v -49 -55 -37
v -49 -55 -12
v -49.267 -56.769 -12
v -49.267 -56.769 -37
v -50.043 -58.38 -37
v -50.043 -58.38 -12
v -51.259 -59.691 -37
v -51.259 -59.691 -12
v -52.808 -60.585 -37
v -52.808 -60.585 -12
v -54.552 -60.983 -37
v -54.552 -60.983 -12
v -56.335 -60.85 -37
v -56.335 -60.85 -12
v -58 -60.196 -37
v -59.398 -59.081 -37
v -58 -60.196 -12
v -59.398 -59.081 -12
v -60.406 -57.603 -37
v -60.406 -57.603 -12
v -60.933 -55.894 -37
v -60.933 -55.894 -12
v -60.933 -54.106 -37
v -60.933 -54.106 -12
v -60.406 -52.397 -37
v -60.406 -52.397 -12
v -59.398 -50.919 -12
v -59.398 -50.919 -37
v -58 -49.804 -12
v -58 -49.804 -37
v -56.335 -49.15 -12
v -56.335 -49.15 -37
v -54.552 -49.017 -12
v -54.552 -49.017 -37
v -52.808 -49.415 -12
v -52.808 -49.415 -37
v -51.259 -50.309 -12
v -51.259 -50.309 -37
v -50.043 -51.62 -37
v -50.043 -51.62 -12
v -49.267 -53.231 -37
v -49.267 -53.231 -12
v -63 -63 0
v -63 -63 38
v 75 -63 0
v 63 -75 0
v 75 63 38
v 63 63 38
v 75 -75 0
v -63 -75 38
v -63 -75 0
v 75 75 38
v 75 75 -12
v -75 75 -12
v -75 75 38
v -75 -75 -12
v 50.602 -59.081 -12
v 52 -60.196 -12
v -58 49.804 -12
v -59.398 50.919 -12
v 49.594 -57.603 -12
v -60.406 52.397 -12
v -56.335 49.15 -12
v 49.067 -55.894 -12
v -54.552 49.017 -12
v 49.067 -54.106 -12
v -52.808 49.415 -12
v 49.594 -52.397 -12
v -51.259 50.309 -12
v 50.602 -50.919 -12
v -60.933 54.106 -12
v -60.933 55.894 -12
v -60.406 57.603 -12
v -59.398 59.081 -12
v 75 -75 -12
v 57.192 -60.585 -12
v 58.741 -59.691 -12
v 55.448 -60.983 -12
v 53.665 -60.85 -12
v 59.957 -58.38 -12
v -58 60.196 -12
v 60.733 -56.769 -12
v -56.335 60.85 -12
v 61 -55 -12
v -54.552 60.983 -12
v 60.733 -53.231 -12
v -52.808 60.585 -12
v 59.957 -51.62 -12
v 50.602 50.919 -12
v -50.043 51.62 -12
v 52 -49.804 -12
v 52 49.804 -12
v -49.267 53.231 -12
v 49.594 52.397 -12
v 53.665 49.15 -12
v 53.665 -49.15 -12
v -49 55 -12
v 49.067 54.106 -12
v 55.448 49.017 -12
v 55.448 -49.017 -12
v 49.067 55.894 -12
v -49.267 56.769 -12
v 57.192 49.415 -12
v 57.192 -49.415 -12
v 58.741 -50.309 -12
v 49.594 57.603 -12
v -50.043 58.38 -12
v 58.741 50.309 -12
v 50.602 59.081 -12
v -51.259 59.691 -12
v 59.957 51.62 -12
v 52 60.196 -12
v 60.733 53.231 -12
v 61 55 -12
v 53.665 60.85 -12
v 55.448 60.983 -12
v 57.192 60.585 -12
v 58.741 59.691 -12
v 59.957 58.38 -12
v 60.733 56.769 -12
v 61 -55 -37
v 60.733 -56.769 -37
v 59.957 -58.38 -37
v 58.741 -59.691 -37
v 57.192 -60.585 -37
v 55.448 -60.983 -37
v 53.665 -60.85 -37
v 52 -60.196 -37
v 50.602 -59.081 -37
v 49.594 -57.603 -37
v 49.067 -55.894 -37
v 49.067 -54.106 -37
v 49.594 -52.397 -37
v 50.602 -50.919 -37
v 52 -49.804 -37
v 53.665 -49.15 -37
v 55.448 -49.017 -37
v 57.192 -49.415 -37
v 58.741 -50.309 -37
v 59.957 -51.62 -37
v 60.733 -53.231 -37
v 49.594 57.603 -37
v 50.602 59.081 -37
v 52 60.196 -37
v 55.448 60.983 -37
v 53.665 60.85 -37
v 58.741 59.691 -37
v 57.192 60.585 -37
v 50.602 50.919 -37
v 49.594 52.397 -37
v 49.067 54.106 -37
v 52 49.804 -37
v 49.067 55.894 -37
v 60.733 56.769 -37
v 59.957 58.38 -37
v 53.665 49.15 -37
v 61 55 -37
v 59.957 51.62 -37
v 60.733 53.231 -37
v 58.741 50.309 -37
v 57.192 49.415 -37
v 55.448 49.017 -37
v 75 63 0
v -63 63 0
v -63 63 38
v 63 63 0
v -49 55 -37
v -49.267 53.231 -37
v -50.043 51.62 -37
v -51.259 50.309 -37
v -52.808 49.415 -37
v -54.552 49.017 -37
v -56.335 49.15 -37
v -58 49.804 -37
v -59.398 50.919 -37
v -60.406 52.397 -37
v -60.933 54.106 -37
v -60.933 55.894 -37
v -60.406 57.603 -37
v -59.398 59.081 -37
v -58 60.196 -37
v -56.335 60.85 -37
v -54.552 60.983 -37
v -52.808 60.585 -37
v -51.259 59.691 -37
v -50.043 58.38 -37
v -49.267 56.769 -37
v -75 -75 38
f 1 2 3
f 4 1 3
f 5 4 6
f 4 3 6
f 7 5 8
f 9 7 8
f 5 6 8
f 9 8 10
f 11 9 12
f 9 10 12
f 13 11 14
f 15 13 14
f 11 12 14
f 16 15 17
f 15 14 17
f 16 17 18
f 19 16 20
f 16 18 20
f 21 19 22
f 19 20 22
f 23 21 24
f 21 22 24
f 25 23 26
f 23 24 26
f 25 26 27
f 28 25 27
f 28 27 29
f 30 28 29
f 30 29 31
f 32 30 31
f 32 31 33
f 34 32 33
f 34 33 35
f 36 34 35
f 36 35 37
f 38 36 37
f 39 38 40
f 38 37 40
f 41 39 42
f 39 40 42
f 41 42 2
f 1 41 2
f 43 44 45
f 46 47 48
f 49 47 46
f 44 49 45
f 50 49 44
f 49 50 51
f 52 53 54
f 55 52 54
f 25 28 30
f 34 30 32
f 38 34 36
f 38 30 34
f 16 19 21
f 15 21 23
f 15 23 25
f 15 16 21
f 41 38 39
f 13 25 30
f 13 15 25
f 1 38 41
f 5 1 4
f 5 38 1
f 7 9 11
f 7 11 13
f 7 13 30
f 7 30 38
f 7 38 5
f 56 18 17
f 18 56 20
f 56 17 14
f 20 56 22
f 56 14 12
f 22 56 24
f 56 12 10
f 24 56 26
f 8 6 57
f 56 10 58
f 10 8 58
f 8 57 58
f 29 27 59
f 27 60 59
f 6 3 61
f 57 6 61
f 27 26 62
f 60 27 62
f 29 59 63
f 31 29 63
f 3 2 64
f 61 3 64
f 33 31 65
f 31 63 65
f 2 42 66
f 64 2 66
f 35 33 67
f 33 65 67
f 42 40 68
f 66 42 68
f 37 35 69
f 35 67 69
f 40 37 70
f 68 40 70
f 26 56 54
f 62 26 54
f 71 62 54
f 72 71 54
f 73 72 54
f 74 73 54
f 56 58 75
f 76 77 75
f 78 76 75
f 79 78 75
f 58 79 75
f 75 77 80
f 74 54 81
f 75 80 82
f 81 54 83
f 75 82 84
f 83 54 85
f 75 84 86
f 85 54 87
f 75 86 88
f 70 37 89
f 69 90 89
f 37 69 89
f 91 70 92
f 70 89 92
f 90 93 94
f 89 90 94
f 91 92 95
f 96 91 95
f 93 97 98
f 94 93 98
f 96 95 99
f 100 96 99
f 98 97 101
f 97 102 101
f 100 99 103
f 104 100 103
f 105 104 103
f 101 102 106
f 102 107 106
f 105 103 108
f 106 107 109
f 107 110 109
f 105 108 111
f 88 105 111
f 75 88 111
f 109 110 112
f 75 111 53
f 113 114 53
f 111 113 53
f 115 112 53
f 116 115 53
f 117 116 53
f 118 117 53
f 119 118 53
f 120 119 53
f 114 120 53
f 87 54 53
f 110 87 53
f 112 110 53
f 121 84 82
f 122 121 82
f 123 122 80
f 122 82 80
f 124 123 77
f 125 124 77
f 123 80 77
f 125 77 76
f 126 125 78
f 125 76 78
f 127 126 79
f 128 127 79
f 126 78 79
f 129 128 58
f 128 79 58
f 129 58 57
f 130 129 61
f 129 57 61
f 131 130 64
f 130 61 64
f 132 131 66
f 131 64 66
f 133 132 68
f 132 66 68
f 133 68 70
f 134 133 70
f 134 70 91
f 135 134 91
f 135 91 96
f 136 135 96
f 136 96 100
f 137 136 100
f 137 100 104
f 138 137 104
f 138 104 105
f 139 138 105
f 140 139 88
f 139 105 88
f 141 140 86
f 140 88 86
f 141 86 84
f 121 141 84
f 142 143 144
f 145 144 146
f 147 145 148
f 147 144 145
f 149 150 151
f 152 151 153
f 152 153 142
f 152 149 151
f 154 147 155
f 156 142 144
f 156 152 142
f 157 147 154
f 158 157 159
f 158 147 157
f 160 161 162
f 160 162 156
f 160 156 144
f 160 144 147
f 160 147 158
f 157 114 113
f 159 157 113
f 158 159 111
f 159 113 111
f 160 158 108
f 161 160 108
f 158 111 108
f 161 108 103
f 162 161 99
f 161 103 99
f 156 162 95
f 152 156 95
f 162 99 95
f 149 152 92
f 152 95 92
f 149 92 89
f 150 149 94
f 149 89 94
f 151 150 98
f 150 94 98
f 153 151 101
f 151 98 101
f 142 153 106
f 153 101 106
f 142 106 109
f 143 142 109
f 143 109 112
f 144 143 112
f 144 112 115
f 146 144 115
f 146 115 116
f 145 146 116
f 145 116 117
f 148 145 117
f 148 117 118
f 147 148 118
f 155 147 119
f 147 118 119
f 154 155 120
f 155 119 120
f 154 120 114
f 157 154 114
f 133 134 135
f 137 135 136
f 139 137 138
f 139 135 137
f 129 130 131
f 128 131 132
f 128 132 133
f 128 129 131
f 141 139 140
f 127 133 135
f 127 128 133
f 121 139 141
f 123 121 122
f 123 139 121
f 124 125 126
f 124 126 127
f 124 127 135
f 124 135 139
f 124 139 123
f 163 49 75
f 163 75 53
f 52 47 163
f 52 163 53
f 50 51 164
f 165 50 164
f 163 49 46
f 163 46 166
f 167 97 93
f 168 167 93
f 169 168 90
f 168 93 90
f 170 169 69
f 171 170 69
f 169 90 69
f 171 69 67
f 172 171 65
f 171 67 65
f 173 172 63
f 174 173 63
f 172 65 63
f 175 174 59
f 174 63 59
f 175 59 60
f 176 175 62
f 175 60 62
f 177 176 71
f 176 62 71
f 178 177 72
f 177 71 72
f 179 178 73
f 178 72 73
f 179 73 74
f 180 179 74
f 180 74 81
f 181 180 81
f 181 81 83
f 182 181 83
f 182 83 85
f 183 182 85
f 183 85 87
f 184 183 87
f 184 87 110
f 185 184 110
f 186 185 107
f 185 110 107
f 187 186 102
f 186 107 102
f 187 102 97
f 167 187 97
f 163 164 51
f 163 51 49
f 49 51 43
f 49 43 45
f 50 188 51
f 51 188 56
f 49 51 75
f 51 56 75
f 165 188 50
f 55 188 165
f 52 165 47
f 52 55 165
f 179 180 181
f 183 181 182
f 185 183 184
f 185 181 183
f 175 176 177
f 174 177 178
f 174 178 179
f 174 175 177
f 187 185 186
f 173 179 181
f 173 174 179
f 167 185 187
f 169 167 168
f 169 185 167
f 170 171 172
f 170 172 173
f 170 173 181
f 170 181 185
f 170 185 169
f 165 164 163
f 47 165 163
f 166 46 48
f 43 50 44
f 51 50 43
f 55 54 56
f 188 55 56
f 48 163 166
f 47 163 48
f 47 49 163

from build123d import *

# Parameters (mm, degrees)
F0_W     = 150
F0_H     = 150
F1_DEPTH = 12
F2_W     = 12
F2_H     = 138
F2_H_2   = 12
F2_W_2   = 138
F3_DEPTH = 38
F5_DEPTH = 12
F7_DEPTH = 12
F8_R     = 6
F9_DEPTH = 25


with BuildPart() as f1:
    # F0 (on Top) → F1 (new body)
    with BuildSketch(Plane.XY):
        Rectangle(F0_W, F0_H)
    extrude(amount=-F1_DEPTH)

    # F2 (on face) → F3 (join)
    with BuildSketch(Plane.XY):
        with Locations((-69, -6)):
            Rectangle(F2_W, F2_H)
        with Locations((-69, 69)):
            Rectangle(F2_W, F2_H_2)
        with Locations((6, 69)):
            Rectangle(F2_W_2, F2_H_2)
    extrude(amount=F3_DEPTH)

    # F8 (on face) → F9 (join)
    with BuildSketch(Plane(origin=(0, 0, -12), x_dir=(1, 0, 0), z_dir=(0, 0, -1))):
        with Locations((-55, 55)):
            Circle(F8_R)
        with Locations((55, 55)):
            Circle(F8_R)
        with Locations((55, -55)):
            Circle(F8_R)
        with Locations((-55, -55)):
            Circle(F8_R)
    extrude(amount=F9_DEPTH)


with BuildPart() as f5:
    # F4 (on face) → F5 (new body)
    with BuildSketch(Plane.XZ.offset(75)):
        Polygon((75, 0), (-63, 38), (-63, 0), align=None)
    extrude(amount=-F5_DEPTH)


with BuildPart() as f7:
    # F6 (on face) → F7 (new body)
    with BuildSketch(Plane.YZ.offset(75)):
        Polygon((63, 0), (63, 38), (-75, 0), align=None)
    extrude(amount=-F7_DEPTH)


solid = Compound([f1.part, f5.part, f7.part])
